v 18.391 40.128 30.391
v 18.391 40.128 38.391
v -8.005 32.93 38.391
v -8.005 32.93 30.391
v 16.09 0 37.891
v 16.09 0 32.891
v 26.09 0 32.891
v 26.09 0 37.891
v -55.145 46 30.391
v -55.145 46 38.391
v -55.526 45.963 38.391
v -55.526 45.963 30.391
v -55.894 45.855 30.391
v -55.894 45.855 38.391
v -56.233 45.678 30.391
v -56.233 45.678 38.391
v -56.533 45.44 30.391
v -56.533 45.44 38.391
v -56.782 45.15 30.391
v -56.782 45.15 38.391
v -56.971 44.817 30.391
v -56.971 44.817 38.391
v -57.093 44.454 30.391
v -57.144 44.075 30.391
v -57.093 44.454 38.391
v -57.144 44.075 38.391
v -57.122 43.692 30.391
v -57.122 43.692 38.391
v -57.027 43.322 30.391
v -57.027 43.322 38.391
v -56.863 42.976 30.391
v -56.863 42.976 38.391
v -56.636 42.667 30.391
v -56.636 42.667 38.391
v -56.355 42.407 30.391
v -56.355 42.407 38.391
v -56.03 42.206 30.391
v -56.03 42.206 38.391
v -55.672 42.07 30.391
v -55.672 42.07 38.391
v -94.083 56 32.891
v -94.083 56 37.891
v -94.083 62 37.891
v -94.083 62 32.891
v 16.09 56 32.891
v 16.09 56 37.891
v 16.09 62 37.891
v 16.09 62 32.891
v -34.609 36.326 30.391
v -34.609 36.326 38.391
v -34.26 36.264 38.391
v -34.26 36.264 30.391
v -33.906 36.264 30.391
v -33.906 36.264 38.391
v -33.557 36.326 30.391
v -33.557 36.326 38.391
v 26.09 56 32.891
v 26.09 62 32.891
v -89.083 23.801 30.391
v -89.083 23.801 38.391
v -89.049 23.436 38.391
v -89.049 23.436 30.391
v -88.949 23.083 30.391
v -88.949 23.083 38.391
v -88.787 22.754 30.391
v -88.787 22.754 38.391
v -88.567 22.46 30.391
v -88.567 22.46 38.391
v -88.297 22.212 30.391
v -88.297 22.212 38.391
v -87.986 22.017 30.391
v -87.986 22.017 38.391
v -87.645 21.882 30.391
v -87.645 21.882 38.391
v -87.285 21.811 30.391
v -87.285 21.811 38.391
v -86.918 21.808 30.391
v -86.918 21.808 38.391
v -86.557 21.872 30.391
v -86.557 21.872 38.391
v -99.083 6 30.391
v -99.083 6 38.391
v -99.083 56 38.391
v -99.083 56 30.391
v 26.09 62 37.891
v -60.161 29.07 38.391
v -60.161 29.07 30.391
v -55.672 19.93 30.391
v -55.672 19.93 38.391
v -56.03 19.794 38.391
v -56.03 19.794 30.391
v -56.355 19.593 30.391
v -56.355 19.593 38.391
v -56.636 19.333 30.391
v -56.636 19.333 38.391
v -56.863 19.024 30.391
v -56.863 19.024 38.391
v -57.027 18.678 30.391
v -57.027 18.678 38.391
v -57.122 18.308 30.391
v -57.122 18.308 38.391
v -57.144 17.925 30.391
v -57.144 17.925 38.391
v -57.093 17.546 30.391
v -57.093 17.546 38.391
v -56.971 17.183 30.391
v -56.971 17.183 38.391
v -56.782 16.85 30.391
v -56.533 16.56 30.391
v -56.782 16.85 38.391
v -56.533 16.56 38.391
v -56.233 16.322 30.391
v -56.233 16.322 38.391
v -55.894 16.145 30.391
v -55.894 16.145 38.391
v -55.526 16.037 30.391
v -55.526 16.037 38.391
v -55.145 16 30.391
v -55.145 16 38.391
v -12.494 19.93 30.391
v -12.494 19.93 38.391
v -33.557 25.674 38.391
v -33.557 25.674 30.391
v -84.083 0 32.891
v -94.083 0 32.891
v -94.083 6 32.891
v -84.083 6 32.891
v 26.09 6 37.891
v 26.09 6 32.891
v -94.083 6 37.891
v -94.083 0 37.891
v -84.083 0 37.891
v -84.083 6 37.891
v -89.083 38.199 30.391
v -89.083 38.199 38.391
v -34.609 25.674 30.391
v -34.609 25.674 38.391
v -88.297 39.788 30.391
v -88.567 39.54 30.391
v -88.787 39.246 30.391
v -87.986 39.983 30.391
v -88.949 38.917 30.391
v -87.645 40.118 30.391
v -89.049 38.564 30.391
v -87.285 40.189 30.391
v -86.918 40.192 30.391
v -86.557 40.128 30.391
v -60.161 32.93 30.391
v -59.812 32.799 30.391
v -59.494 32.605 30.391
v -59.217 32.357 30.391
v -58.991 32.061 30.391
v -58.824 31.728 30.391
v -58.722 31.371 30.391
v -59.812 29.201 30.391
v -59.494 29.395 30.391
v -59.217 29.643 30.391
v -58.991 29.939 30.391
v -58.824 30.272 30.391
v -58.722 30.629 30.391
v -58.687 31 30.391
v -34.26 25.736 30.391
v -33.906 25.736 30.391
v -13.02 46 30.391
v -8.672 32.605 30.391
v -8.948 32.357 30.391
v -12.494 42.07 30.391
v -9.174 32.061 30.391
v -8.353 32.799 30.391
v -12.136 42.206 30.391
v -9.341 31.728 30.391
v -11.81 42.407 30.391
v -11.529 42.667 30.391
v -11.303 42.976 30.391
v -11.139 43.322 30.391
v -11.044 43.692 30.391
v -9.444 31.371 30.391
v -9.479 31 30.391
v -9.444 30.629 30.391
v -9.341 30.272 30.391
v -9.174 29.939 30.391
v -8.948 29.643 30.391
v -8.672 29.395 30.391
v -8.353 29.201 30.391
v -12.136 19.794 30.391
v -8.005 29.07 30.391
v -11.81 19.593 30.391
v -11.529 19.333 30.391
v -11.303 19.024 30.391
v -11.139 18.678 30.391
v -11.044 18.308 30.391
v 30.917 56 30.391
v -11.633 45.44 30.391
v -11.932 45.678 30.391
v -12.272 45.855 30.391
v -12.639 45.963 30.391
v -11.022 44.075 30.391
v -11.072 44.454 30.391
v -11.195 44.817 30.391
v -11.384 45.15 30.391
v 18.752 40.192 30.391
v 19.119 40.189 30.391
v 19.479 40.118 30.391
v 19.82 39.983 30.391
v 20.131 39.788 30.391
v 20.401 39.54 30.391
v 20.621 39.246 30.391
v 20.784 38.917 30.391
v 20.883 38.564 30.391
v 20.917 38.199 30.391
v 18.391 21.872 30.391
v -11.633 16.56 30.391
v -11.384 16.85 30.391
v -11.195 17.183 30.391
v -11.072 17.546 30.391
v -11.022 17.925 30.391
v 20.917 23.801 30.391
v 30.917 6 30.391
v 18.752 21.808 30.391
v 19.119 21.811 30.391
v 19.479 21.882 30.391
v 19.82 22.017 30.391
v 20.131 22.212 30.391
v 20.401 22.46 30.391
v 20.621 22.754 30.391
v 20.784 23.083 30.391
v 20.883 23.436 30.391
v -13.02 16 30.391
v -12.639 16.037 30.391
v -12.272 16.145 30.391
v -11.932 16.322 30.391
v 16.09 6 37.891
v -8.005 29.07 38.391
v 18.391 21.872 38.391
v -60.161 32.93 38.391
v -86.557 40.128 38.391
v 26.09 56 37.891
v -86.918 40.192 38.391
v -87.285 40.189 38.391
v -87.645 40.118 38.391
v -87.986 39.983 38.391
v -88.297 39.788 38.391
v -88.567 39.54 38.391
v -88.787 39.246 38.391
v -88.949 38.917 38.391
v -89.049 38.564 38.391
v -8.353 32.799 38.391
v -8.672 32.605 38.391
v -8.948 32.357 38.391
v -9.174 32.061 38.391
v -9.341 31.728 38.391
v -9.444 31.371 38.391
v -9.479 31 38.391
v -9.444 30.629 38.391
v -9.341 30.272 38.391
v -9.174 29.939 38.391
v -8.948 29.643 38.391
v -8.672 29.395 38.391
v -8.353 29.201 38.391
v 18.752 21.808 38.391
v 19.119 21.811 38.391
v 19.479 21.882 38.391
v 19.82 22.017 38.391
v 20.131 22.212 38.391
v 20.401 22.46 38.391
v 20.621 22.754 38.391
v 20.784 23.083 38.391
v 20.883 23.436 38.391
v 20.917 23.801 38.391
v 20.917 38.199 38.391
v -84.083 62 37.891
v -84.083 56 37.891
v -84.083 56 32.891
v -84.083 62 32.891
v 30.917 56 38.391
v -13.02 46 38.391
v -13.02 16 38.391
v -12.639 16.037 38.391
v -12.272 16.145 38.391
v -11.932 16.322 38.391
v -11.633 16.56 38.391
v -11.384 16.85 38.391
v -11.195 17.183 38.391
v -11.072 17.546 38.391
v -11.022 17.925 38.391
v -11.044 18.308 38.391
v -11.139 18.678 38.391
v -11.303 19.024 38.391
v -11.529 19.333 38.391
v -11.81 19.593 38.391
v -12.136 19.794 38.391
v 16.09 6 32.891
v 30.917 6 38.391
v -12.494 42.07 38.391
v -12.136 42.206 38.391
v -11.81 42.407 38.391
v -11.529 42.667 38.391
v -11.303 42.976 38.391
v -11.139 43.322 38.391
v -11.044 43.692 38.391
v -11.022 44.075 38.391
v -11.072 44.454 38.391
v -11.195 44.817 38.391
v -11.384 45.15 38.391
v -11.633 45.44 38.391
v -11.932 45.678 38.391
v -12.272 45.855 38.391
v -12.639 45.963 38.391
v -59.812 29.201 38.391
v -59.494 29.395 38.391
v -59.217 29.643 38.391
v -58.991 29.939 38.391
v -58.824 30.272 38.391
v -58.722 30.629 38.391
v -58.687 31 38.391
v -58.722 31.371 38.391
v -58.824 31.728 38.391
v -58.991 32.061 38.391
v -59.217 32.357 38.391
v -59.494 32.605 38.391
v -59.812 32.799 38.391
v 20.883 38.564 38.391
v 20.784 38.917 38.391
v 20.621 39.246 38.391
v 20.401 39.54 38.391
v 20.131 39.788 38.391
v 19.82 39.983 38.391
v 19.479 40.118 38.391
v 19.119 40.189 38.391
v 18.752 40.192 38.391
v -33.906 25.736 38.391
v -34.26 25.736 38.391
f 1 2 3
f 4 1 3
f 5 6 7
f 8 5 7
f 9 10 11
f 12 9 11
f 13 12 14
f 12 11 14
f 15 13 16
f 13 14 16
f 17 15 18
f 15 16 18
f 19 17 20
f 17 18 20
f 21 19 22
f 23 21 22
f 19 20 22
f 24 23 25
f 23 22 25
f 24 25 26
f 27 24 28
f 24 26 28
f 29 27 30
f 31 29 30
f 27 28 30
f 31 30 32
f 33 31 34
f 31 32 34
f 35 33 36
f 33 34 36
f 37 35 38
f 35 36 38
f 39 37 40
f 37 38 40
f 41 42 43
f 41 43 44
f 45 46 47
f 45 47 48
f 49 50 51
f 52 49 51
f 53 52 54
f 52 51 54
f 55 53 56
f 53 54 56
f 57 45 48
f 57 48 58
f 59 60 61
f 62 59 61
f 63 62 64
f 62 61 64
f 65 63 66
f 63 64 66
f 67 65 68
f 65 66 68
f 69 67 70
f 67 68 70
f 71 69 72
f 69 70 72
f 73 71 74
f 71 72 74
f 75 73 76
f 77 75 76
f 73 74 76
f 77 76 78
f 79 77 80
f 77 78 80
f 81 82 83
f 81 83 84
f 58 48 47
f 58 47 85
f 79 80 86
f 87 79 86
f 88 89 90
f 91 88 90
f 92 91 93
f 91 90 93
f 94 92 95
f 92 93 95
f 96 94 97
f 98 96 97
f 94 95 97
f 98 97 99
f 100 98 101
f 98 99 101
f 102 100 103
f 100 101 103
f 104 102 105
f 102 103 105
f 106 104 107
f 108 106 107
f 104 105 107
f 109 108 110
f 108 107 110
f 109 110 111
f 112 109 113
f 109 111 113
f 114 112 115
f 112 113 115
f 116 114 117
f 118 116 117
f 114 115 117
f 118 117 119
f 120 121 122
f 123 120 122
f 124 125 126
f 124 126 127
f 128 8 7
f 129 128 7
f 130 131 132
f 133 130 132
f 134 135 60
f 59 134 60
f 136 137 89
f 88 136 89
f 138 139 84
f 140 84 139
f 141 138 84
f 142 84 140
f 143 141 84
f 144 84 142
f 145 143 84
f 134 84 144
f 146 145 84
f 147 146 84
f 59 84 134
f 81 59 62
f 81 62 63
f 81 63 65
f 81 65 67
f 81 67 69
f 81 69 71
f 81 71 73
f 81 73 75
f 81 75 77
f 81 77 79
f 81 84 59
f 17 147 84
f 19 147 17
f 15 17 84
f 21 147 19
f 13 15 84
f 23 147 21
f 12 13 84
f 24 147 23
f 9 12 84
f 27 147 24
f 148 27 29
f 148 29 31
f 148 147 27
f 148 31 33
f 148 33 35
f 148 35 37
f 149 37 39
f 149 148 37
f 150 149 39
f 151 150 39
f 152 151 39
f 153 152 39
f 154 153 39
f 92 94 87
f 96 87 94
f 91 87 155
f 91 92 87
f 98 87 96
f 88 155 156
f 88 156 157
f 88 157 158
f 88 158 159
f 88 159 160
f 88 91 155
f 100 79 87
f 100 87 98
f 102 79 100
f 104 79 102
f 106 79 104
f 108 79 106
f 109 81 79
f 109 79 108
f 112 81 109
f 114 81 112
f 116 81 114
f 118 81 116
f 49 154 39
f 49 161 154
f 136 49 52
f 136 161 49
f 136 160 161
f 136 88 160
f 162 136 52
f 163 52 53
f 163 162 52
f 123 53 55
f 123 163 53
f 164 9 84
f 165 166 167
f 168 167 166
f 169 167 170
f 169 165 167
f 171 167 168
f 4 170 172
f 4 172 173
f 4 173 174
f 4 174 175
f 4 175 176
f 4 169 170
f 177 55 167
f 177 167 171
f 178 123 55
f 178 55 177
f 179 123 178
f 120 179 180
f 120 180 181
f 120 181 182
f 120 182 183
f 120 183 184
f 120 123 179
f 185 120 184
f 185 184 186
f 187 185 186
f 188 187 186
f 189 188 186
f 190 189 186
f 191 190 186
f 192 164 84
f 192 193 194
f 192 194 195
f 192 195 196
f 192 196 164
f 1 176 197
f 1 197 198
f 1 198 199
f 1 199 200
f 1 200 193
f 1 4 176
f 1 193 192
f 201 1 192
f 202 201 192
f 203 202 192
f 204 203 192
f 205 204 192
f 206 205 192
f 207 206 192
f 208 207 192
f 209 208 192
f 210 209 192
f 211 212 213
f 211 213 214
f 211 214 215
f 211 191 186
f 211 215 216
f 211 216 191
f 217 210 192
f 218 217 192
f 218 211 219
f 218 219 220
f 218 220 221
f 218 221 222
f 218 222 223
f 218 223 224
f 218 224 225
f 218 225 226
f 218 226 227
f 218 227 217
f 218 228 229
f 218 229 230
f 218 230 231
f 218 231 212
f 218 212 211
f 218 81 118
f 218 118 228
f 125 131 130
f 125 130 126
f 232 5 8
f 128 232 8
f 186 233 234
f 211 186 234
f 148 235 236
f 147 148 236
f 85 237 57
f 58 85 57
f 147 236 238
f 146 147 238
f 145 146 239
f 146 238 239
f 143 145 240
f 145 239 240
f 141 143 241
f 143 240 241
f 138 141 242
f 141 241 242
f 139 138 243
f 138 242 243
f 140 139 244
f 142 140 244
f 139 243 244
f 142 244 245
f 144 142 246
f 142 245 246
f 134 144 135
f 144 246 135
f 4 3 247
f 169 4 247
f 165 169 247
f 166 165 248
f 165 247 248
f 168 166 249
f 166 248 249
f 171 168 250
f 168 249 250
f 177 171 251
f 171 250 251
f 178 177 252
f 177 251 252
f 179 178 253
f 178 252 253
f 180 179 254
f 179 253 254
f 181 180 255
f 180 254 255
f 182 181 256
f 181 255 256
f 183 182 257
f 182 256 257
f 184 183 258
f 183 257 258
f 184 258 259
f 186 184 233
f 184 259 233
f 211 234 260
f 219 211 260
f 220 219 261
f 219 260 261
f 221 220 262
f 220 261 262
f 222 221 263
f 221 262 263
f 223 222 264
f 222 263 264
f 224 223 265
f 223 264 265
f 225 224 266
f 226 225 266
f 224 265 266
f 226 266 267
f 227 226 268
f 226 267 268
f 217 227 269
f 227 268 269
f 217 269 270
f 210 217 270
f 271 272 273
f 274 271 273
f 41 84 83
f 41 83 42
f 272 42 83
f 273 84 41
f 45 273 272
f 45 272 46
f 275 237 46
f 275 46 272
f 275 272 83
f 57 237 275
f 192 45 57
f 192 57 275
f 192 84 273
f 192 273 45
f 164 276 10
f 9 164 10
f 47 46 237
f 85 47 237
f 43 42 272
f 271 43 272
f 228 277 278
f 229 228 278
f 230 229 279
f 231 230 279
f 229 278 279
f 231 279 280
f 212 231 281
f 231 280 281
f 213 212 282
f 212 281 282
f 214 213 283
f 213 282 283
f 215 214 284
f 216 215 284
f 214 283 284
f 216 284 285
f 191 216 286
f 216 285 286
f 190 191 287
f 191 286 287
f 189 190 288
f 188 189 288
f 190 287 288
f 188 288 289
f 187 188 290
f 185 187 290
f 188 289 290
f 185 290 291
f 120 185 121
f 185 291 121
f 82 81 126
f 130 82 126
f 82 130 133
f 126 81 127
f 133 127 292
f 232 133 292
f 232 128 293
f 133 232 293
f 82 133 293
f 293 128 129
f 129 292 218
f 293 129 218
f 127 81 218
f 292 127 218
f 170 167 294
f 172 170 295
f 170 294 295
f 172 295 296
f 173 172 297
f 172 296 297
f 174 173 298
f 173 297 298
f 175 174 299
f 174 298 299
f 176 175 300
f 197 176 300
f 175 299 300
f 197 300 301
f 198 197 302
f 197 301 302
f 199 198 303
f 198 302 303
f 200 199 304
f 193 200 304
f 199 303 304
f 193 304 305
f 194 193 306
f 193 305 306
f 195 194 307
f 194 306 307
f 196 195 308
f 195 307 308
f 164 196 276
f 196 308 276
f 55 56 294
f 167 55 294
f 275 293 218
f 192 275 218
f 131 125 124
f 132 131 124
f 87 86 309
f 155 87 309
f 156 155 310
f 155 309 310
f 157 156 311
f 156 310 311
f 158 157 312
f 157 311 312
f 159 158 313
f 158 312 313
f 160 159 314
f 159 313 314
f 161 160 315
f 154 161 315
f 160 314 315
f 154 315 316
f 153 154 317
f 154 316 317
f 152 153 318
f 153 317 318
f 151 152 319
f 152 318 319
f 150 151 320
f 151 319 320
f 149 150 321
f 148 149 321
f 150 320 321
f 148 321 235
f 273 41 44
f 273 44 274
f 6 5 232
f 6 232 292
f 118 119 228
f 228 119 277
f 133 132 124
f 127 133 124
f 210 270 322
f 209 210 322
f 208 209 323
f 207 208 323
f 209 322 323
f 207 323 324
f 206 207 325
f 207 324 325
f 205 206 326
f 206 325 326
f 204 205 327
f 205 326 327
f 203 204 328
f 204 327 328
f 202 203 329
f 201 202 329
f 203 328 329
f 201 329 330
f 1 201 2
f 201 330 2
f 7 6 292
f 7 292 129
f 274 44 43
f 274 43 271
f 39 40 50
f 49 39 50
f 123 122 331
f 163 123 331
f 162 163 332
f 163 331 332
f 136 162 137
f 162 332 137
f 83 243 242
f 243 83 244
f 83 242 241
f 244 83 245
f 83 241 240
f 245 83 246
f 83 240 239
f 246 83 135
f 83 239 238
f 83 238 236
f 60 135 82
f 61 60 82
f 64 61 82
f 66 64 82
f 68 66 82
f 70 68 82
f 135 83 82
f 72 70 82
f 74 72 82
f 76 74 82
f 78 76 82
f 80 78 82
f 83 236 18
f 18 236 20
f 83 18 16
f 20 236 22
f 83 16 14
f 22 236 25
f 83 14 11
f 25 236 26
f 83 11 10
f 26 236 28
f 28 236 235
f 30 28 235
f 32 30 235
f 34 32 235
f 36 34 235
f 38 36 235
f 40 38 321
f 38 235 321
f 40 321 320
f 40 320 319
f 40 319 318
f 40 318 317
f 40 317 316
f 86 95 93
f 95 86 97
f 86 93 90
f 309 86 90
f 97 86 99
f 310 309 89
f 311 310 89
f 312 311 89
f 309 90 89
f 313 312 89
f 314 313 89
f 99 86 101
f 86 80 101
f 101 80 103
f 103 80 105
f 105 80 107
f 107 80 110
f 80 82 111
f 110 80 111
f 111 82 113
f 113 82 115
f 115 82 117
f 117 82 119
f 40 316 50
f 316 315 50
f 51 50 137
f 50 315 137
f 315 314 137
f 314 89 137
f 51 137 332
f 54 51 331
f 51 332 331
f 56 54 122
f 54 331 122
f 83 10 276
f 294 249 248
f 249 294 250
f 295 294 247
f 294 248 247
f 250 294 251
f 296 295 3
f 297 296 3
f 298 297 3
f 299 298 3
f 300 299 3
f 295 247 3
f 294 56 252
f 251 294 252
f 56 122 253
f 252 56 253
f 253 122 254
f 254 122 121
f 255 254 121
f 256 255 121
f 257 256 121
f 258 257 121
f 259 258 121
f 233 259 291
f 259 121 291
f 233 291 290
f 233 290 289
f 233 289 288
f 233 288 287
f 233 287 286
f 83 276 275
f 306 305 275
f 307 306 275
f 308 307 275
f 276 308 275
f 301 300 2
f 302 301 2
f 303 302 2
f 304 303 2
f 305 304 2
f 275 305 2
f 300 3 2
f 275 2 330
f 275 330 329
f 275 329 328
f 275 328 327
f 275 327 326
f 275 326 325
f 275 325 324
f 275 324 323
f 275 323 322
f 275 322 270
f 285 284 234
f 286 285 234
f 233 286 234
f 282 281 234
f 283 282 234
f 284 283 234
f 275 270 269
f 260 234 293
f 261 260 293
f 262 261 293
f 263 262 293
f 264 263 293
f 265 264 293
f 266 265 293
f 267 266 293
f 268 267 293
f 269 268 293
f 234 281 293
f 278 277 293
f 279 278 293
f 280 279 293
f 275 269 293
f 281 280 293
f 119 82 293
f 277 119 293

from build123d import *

# Parameters (mm, degrees)
SKETCH1_W             = 10
SKETCH1_H             = 5
BOSS_EXTRUDE1_DEPTH   = 6
BOSS_EXTRUDE1_2_DEPTH = 6
SKETCH2_W             = 130
SKETCH2_H             = 8
BOSS_EXTRUDE2_DEPTH   = 50
SKETCH3_W             = 10
SKETCH3_H             = 5
BOSS_EXTRUDE3_DEPTH   = 6
CUT_EXTRUDE1_DEPTH    = 118.155500326


with BuildPart() as part:
    # Sketch1 → Boss-Extrude1 (new body)
    with BuildSketch(Plane(origin=(0, 0, 0), x_dir=(1, 0, 0), z_dir=(0, 1, 0))):
        with Locations((21.089936581, -35.391183382)):
            Rectangle(SKETCH1_W, SKETCH1_H)
    extrude(amount=BOSS_EXTRUDE1_DEPTH)



with BuildPart() as body_2:
    # Sketch1 → Boss-Extrude1 2 (new body)
    with BuildSketch(Plane(origin=(0, 0, 0), x_dir=(1, 0, 0), z_dir=(0, 1, 0))):
        with Locations((-89.082850467, -35.391183382)):
            Rectangle(SKETCH1_W, SKETCH1_H)
    extrude(amount=BOSS_EXTRUDE1_2_DEPTH)


with BuildPart() as part_1:
    add(part.part)

    add(body_2.part)  # Boss-Extrude2 merges body 2
    # Sketch2 → Boss-Extrude2 (add)
    with BuildSketch(Plane(origin=(0, 6, 0), x_dir=(1, 0, 0), z_dir=(0, 1, 0))):
        with Locations((-34.082850467, -34.391183382)):
            Rectangle(SKETCH2_W, SKETCH2_H)
    extrude(amount=BOSS_EXTRUDE2_DEPTH)

    # Sketch3 → Boss-Extrude3 (add)
    with BuildSketch(Plane(origin=(0, 56, 0), x_dir=(1, 0, 0), z_dir=(0, 1, 0))):
        with Locations((-89.082850467, -35.391183382)):
            Rectangle(SKETCH3_W, SKETCH3_H)
        with Locations((21.089936581, -35.391183382)):
            Rectangle(SKETCH3_W, SKETCH3_H)
    extrude(amount=BOSS_EXTRUDE3_DEPTH)

    # Sketch4 → Cut-Extrude1 (cut, through all)
    with BuildSketch(Plane.XY.offset(38.391183382)):
        with BuildLine():
            Line((-13.020277053, 46), (-55.145423882, 46))
            ThreePointArc((-55.145423882, 46), (-57.127727502, 44.265466302), (-55.671658693, 42.070472358))
            Line((-55.671658693, 42.070472358), (-34.609085279, 36.326134154))
            ThreePointArc((-34.609085279, 36.326134154), (-34.082850467, 36.255661796), (-33.556615656, 36.326134154))
            Line((-33.556615656, 36.326134154), (-12.494042241, 42.070472358))
            ThreePointArc((-12.494042241, 42.070472358), (-11.037973433, 44.265466302), (-13.020277053, 46))
        make_face()
        with BuildLine():
            Line((-89.082850467, 38.198883658), (-89.082850467, 23.801116342))
            ThreePointArc((-89.082850467, 23.801116342), (-88.296837777, 22.211702987), (-86.556615656, 21.871588699))
            Line((-86.556615656, 21.871588699), (-60.160708908, 29.070472358))
            ThreePointArc((-60.160708908, 29.070472358), (-58.68694372, 31), (-60.160708908, 32.929527642))
            Line((-60.160708908, 32.929527642), (-86.556615656, 40.128411301))
            ThreePointArc((-86.556615656, 40.128411301), (-88.296837777, 39.788297013), (-89.082850467, 38.198883658))
        make_face()
        with BuildLine():
            Line((-55.145423882, 16), (-13.020277053, 16))
            ThreePointArc((-13.020277053, 16), (-11.037973433, 17.734533698), (-12.494042241, 19.929527642))
            Line((-12.494042241, 19.929527642), (-33.556615656, 25.673865846))
            ThreePointArc((-33.556615656, 25.673865846), (-34.082850467, 25.744338204), (-34.609085279, 25.673865846))
            Line((-34.609085279, 25.673865846), (-55.671658693, 19.929527642))
            ThreePointArc((-55.671658693, 19.929527642), (-57.127727502, 17.734533698), (-55.145423882, 16))
        make_face()
        with BuildLine():
            Line((20.917149533, 23.801116342), (20.917149533, 38.198883658))
            ThreePointArc((20.917149533, 38.198883658), (20.131136843, 39.788297013), (18.390914721, 40.128411301))
            Line((18.390914721, 40.128411301), (-8.004992027, 32.929527642))
            ThreePointArc((-8.004992027, 32.929527642), (-9.478757215, 31), (-8.004992027, 29.070472358))
            Line((-8.004992027, 29.070472358), (18.390914721, 21.871588699))
            ThreePointArc((18.390914721, 21.871588699), (20.131136843, 22.211702987), (20.917149533, 23.801116342))
        make_face()
    extrude(amount=-CUT_EXTRUDE1_DEPTH, mode=Mode.SUBTRACT)


solid = part_1.part
